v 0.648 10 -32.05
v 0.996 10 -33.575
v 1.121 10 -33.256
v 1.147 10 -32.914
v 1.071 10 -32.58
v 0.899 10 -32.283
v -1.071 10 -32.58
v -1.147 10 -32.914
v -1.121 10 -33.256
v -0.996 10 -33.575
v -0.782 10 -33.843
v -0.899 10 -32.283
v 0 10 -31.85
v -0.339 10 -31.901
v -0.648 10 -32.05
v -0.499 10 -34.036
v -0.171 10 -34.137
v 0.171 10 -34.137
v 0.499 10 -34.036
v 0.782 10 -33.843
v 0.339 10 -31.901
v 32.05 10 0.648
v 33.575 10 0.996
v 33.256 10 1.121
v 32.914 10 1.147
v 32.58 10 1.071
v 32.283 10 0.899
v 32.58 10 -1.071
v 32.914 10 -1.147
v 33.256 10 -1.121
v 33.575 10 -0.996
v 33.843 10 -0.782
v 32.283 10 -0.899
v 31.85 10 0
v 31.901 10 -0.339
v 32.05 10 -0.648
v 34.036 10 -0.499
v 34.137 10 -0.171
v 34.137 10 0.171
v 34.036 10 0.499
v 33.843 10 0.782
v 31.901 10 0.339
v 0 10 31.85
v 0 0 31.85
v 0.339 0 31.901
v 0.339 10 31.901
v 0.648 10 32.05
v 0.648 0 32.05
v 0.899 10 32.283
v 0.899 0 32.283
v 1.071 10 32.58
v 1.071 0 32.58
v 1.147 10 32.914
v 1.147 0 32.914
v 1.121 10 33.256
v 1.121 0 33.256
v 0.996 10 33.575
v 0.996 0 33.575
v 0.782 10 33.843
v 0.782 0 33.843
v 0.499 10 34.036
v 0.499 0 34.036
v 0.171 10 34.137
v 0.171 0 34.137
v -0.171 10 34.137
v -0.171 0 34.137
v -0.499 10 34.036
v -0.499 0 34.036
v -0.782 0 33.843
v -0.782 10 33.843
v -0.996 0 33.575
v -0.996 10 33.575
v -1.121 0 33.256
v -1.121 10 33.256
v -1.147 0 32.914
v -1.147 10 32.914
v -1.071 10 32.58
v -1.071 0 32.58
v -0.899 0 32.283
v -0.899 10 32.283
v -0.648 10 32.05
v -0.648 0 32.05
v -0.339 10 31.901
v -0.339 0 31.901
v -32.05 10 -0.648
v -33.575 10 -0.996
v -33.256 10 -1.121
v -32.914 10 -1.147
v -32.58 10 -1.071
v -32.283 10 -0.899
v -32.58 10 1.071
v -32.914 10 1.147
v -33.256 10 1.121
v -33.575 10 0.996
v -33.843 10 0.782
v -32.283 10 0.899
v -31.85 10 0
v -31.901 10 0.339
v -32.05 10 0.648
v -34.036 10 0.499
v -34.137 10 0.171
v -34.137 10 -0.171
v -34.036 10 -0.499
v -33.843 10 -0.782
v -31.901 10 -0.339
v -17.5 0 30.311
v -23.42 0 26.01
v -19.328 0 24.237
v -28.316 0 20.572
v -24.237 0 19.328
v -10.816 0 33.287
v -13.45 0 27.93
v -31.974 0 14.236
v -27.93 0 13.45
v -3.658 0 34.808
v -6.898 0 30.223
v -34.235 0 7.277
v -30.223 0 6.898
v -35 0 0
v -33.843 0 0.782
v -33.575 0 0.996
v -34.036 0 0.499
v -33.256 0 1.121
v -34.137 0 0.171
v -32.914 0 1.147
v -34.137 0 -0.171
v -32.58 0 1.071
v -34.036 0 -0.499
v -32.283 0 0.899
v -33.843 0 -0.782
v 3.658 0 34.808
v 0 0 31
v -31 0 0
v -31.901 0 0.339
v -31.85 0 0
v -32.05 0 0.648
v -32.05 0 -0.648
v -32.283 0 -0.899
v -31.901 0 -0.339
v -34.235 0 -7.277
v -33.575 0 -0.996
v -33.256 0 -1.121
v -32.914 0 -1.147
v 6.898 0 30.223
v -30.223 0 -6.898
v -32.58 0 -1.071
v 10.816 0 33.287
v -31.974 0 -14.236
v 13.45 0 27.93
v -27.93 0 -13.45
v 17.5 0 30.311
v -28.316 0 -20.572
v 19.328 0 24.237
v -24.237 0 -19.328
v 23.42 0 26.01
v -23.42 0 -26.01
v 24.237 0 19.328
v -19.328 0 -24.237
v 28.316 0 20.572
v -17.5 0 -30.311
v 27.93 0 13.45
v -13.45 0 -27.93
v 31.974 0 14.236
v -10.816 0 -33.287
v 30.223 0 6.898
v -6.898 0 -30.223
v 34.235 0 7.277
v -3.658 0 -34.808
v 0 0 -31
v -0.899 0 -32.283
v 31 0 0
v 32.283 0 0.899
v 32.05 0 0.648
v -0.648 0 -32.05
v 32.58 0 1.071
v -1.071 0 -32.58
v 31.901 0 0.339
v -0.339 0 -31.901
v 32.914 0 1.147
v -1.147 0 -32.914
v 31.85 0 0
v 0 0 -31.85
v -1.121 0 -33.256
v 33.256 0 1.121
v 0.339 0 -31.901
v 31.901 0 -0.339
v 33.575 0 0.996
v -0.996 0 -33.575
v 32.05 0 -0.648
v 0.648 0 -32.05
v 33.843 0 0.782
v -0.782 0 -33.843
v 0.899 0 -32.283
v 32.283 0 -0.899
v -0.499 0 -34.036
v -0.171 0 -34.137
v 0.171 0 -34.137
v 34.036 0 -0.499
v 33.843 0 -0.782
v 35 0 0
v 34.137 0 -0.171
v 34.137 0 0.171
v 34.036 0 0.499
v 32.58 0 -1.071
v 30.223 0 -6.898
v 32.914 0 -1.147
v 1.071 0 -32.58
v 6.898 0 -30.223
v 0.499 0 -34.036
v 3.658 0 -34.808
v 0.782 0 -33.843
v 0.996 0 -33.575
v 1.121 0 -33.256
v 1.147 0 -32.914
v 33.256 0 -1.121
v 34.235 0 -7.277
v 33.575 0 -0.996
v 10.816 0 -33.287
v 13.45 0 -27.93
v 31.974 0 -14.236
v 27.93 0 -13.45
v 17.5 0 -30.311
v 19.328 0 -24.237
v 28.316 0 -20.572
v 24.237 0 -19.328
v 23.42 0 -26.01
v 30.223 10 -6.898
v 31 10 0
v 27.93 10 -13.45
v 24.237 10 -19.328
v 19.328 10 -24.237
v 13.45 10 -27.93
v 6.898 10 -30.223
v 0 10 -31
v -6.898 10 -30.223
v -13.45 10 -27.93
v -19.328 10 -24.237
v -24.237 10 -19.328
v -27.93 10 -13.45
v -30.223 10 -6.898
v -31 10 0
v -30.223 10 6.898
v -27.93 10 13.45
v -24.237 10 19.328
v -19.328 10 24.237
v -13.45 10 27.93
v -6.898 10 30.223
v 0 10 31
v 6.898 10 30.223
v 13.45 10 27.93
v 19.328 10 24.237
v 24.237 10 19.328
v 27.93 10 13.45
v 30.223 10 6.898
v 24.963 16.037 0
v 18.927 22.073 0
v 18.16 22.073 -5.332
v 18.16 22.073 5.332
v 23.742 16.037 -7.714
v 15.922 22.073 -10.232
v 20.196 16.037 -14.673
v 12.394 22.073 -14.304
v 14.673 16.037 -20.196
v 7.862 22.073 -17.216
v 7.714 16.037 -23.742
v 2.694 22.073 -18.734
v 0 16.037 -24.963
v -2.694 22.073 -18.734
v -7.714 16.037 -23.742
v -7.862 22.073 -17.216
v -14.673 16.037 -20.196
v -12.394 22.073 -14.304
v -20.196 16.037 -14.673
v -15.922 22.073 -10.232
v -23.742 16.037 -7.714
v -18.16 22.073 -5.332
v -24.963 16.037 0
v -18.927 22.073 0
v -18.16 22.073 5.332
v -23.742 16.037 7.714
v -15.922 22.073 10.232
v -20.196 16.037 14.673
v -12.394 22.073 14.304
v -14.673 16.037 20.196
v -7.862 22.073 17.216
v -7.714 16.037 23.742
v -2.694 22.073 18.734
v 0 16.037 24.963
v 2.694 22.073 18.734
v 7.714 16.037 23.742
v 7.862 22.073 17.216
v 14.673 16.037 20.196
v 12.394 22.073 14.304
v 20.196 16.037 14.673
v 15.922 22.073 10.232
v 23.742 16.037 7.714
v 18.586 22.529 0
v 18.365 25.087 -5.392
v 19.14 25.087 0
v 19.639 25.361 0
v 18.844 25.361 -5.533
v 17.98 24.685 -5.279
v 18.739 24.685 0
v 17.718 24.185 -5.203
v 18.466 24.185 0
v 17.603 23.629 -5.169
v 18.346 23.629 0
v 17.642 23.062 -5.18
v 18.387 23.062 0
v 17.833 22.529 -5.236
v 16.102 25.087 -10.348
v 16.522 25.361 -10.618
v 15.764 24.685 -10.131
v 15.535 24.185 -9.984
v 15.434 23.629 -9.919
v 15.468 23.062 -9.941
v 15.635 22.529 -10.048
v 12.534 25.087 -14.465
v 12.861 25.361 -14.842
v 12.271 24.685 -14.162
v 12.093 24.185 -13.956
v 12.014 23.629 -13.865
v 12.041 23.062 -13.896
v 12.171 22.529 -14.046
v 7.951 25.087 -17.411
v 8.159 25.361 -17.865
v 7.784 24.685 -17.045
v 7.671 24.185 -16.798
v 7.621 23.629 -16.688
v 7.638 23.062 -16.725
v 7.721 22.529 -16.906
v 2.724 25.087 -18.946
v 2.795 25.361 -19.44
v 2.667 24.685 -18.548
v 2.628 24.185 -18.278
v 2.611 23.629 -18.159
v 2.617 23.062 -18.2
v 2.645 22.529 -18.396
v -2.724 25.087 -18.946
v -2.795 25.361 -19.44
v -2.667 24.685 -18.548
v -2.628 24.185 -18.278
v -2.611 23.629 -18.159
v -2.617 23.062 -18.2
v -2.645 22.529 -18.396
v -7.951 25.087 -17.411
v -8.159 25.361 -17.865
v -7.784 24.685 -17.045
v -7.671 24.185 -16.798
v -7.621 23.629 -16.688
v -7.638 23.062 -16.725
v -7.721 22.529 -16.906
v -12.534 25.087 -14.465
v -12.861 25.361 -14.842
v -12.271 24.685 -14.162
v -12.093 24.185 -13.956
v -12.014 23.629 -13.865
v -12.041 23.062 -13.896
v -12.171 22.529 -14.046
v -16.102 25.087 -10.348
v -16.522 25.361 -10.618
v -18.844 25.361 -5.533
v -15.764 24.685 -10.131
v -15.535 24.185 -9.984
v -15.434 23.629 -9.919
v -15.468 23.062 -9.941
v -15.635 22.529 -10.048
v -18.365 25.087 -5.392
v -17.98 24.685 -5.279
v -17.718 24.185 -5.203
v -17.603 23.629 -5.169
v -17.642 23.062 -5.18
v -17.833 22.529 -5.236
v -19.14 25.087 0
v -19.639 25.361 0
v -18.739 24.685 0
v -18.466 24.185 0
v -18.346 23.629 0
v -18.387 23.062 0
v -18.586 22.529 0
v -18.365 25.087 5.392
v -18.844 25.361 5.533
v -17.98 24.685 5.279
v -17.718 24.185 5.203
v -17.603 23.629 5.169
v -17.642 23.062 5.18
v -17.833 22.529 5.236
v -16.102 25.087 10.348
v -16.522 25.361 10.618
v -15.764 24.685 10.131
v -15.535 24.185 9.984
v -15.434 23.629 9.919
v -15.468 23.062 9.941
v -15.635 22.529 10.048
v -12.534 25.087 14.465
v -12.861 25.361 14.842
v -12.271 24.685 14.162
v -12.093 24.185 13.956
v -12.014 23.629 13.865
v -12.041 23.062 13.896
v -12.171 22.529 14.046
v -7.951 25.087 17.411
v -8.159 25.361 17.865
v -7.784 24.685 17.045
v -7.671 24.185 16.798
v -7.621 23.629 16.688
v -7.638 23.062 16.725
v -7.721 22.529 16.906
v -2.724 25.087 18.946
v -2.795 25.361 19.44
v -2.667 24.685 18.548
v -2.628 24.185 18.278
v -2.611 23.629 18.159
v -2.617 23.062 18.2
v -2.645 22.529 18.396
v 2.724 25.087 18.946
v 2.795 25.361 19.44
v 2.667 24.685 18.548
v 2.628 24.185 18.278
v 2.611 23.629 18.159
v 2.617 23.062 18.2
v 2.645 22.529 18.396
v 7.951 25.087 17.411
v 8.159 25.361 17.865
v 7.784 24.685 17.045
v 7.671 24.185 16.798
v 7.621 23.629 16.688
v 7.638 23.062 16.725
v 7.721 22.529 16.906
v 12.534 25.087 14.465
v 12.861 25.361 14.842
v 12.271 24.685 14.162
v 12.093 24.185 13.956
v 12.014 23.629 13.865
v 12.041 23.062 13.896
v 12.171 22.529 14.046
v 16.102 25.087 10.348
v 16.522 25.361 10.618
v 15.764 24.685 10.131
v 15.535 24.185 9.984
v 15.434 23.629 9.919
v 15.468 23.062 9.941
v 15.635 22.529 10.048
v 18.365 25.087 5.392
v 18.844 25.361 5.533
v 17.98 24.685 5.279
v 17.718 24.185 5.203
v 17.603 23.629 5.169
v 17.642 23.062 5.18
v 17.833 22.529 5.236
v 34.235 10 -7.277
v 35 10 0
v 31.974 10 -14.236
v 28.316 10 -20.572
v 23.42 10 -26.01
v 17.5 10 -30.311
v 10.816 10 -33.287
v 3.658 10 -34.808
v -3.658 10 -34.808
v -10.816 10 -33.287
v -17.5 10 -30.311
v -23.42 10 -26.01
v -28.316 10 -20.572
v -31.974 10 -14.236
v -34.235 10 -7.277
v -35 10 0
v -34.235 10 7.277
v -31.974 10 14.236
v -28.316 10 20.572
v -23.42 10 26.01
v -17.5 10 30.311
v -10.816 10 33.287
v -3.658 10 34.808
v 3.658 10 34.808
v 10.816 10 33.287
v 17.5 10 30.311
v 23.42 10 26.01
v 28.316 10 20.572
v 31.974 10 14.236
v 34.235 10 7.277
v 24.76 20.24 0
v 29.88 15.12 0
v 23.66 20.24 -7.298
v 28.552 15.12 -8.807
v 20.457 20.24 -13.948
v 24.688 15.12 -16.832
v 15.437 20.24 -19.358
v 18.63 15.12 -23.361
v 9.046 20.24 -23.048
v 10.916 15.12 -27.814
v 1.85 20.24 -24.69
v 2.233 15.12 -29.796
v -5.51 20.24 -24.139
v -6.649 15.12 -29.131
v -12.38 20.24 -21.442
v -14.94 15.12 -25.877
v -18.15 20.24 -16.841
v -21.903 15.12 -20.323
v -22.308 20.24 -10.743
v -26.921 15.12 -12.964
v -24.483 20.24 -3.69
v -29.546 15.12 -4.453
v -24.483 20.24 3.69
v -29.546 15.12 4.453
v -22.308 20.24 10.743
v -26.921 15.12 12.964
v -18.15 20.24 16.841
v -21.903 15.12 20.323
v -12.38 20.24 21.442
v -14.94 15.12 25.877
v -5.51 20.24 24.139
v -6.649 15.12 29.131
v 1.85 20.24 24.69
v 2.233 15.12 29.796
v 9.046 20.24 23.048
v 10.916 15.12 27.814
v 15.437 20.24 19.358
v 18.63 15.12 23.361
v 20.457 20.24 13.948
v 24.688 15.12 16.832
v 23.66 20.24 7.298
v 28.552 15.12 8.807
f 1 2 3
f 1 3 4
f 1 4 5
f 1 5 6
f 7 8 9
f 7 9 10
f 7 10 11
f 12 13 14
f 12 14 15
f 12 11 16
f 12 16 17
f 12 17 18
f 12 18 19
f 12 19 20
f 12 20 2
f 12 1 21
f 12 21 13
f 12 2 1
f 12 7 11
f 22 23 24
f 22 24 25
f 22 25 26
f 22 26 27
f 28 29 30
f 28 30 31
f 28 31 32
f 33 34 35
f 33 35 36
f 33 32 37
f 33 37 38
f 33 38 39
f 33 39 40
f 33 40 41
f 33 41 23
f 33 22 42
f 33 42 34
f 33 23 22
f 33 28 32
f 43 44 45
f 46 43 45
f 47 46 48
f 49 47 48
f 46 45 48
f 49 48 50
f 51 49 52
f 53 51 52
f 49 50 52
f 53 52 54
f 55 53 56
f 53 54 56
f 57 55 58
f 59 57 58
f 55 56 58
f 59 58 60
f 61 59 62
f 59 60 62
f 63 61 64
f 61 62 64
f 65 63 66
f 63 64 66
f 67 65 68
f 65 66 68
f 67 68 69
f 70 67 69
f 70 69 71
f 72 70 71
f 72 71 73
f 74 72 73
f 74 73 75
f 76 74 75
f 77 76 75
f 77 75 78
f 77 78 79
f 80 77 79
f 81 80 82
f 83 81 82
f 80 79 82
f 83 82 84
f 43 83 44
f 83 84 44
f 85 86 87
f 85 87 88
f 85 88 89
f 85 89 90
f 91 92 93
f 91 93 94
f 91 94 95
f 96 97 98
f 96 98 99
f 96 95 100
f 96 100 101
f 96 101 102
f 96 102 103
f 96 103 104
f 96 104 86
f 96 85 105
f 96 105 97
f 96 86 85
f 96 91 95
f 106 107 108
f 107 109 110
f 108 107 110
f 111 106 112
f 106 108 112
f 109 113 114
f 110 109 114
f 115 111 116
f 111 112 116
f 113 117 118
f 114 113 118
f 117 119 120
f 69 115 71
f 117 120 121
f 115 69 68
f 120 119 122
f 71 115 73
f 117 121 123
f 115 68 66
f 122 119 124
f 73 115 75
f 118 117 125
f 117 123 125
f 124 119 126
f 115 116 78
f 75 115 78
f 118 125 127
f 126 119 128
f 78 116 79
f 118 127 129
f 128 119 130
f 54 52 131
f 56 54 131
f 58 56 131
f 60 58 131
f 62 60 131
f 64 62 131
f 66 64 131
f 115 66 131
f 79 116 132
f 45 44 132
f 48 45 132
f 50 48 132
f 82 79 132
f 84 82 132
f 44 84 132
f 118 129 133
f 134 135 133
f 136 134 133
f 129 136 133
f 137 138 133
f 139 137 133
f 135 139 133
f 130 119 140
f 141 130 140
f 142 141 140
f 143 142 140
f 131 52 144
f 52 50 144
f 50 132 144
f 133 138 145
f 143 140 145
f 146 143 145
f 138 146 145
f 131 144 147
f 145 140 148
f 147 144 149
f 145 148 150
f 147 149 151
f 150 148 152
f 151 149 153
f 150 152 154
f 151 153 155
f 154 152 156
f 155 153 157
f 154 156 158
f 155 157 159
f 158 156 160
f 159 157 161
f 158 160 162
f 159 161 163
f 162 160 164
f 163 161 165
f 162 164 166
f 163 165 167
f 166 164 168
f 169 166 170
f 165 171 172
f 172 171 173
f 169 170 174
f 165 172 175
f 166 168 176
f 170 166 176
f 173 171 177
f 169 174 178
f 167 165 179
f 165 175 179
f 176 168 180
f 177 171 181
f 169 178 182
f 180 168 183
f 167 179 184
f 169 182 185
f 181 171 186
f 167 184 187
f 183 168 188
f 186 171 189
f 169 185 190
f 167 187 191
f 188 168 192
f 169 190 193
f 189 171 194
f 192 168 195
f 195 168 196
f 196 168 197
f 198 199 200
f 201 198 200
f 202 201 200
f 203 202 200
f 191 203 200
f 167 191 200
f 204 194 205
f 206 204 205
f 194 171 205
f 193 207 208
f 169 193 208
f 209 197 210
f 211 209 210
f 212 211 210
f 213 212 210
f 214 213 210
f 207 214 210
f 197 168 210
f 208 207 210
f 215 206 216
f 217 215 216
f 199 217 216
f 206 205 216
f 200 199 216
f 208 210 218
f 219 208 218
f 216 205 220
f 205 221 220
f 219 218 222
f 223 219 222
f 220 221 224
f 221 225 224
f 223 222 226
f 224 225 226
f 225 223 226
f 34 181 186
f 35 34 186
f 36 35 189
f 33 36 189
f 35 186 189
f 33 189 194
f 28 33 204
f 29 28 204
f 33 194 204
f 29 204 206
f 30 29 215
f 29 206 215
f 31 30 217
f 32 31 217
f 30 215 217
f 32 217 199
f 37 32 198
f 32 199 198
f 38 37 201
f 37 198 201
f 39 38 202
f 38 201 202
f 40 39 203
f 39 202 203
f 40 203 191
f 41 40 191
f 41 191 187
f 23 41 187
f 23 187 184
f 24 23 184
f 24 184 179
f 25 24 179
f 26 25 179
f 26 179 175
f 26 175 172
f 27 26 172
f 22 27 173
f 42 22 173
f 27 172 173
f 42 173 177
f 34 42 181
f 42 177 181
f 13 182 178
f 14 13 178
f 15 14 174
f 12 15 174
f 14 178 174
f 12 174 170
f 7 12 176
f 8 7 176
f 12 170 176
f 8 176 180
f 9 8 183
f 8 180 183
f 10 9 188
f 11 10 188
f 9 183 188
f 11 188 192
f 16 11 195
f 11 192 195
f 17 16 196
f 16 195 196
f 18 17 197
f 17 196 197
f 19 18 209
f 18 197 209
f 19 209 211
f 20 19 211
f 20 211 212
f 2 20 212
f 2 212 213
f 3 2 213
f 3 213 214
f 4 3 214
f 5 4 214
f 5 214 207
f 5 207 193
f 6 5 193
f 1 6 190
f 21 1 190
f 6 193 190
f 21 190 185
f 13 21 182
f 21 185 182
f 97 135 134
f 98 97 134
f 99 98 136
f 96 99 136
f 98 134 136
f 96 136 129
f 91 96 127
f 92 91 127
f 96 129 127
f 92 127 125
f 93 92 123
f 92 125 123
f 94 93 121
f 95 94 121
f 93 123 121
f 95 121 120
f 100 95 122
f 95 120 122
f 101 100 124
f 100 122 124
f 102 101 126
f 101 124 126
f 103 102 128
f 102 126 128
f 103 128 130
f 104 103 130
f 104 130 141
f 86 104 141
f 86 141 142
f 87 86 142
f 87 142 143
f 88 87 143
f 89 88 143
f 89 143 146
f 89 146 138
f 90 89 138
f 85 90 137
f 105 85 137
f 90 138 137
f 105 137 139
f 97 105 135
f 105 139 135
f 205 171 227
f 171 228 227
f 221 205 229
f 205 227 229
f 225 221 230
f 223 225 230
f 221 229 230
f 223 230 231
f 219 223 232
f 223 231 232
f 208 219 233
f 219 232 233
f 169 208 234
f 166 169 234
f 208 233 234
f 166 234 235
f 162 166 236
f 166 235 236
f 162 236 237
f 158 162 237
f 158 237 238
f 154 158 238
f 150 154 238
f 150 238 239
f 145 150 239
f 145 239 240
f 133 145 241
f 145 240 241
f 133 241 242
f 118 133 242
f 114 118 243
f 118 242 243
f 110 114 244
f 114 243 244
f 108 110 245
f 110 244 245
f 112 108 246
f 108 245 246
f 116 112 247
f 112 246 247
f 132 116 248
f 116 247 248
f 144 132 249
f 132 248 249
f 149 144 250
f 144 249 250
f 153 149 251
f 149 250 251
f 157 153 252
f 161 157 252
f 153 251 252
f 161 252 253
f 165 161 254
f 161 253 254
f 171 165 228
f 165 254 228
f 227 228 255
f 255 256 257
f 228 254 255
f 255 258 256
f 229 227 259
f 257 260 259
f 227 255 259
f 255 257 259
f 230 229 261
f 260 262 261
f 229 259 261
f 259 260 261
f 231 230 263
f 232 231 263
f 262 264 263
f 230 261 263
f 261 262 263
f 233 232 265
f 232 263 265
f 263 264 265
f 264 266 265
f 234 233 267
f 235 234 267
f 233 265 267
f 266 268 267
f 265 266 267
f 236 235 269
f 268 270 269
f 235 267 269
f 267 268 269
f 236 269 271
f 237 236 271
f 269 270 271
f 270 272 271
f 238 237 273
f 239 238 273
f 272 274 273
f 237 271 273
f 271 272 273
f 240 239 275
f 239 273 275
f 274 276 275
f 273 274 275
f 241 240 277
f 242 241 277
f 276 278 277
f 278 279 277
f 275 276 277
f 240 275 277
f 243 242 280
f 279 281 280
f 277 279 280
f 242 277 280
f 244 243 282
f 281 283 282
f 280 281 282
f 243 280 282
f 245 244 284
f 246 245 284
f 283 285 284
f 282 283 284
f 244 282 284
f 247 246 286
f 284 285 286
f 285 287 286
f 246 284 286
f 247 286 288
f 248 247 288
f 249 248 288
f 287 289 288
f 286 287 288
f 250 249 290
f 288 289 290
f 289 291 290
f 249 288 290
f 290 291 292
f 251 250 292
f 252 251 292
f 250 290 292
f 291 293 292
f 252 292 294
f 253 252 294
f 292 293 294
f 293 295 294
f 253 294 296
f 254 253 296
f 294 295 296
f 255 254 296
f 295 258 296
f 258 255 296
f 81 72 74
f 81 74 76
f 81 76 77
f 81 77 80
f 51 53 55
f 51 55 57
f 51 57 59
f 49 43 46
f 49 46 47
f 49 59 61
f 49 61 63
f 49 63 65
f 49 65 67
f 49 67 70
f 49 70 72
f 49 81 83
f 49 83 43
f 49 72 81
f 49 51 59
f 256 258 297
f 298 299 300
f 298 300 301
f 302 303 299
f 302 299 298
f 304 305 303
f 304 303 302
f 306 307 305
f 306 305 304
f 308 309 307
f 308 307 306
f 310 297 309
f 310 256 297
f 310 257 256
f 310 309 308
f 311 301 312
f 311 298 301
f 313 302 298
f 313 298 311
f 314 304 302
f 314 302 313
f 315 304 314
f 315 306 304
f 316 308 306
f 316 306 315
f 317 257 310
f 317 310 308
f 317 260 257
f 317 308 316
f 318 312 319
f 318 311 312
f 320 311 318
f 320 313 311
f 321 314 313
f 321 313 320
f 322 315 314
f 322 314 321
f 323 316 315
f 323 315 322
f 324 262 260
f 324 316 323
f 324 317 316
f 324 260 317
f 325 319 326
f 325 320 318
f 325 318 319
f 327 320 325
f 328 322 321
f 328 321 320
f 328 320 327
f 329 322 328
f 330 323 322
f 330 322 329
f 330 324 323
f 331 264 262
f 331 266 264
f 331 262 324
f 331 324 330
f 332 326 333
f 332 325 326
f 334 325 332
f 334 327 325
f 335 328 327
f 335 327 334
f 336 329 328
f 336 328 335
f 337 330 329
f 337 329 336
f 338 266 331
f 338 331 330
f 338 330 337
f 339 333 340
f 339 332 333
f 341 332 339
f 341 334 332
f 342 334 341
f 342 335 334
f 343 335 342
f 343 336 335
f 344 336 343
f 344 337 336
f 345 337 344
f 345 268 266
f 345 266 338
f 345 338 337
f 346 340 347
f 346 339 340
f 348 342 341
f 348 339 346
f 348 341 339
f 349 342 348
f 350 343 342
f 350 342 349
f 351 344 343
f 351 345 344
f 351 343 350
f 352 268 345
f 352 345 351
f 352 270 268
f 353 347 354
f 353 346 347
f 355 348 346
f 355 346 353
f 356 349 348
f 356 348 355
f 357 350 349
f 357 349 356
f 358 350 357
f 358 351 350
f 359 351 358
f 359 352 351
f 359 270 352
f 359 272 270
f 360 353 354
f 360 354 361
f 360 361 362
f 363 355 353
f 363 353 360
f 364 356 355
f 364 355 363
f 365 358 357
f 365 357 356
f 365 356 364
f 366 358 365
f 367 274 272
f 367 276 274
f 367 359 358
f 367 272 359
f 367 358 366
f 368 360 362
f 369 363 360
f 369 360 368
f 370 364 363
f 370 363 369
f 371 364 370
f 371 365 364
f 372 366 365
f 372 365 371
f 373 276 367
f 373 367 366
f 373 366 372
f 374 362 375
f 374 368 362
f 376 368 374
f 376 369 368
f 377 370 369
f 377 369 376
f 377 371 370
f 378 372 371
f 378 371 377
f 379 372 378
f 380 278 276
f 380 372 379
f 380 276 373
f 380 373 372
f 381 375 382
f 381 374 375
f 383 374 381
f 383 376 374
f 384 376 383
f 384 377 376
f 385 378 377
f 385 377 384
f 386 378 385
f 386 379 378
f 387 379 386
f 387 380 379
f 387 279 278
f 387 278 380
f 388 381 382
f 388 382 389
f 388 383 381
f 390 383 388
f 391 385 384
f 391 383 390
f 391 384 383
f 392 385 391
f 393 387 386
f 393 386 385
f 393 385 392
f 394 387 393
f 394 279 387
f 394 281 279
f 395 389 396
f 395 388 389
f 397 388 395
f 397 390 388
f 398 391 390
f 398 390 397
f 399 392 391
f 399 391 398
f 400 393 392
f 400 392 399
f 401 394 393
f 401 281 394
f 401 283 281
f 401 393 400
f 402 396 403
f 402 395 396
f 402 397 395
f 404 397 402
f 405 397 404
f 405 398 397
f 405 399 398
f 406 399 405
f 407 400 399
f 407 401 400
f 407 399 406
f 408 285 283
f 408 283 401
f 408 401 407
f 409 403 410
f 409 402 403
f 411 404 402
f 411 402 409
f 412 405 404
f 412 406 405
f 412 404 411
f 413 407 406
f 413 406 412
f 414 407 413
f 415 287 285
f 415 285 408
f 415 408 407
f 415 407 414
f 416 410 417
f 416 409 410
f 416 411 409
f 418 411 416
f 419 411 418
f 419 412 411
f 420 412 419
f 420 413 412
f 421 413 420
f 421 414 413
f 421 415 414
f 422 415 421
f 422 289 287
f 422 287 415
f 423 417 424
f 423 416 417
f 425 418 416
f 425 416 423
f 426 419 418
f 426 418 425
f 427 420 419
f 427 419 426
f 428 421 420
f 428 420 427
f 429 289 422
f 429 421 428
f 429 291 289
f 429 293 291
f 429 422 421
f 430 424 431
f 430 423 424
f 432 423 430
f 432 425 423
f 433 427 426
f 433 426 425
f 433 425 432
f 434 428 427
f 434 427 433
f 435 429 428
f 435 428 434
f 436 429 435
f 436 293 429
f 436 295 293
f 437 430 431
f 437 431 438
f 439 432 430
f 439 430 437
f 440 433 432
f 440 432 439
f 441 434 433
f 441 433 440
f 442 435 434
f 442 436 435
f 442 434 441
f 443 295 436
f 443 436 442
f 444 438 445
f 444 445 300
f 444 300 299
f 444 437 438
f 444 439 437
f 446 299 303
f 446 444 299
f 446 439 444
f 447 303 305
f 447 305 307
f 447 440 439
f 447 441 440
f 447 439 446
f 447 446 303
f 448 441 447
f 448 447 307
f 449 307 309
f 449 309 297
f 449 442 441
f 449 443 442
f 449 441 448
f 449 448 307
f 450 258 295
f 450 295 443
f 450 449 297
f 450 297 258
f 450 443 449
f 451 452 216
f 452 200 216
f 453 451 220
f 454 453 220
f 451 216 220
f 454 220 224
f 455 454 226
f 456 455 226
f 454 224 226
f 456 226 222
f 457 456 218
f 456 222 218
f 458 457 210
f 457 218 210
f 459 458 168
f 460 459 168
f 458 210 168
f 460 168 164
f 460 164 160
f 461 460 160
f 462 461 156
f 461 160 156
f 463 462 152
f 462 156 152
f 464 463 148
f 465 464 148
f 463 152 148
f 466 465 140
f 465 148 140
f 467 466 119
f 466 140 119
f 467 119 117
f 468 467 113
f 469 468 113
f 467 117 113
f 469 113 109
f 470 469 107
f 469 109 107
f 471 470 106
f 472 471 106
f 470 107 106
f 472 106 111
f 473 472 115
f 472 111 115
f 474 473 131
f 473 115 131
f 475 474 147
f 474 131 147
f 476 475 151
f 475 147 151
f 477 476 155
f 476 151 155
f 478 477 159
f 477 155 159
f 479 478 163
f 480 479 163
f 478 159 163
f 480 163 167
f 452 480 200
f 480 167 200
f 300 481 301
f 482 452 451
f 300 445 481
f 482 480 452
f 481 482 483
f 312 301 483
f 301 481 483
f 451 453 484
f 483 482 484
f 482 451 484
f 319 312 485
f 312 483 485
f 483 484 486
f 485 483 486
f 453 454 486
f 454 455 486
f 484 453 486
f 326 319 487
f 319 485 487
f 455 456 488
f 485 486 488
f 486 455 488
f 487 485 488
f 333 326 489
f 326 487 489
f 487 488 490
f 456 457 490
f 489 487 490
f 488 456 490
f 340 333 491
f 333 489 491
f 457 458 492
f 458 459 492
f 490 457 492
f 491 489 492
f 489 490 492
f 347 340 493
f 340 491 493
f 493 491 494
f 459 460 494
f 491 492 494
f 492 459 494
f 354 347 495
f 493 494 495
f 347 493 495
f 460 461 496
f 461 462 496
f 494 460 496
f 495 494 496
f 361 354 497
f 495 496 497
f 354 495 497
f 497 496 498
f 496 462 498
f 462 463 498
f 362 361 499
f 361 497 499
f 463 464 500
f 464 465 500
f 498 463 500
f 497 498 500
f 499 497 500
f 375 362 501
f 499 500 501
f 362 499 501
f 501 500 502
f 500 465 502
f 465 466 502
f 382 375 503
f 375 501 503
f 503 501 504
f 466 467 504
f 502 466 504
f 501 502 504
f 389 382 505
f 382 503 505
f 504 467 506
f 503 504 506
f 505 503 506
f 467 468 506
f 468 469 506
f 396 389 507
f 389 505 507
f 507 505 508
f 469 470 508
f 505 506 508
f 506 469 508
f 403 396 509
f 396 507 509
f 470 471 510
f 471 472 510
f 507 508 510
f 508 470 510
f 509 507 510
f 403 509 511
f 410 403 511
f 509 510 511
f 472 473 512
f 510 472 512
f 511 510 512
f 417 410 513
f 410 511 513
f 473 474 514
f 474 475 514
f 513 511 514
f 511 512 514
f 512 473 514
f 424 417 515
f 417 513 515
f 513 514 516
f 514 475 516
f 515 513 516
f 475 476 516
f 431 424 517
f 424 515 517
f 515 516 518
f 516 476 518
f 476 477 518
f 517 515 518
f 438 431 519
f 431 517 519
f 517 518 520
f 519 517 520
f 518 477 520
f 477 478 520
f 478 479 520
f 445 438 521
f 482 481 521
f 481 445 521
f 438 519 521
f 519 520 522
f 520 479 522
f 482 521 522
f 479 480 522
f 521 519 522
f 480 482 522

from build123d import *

# Parameters (mm, degrees)
FILLET1_R          = 2
SKETCH3_R          = 1.15
CUT_EXTRUDE1_DEPTH = 10
CIRPATTERN1_COUNT  = 4


with BuildPart() as part:
    # Sketch2 → Revolve1 (revolve)
    with BuildSketch(Plane.XY, mode=Mode.PRIVATE) as revolve1_sk:
        Polygon((-31, 0), (-31, 10), (-15.639434665, 25.360565335), (-19.639434665, 25.360565335), (-35, 10), (-35, 0), align=None)
    revolve(revolve1_sk.sketch.rotate(Axis((0, 0, 0), (0, 1, 0)), 180), axis=Axis((0, 0, 0), (0, 1, 0)))

    # Fillet1
    # the kernel refuses this fillet: 2 mm, written as the material it takes off along each edge
    with BuildSketch(Plane(origin=(0, 25.360565335, 0), x_dir=(1, 0, 0), z_dir=(0, 0, 1))) as fillet1_piece_1:
        with BuildLine():
            CenterArc((20.340836733, -1.872974943), FILLET1_R, 110.530199479, 114.469800521)
            Line((19.639434665, 0), (19.625406624, 0.037459499))
            ThreePointArc((19.625406624, 0.037459499), (17.639434665, 0.04), (15.639434665, 0.04))
            Line((15.639434665, 0.04), (15.611150394, -0.028284271))
            Line((15.611150394, -0.028284271), (18.8983389, -3.315472777))
            Line((18.8983389, -3.315472777), (18.926623171, -3.287188506))
        make_face()
    revolve(axis=Axis((0, 25.360565335, 0), (0, 1, 0)), mode=Mode.SUBTRACT)

    # Sketch3 → Cut-Extrude1 (cut)
    with BuildSketch(Plane.XZ):
        with Locations(Location((0, 33, 0), (0, 0, 270))):
            Circle(SKETCH3_R)
    cut_extrude1 = extrude(amount=-CUT_EXTRUDE1_DEPTH, mode=Mode.SUBTRACT)

    # CirPattern1: Cut-Extrude1 ×4 about axis
    cirpattern1_axis = Axis((0, 0, 0), (0, 1, 0))
    for i in range(1, CIRPATTERN1_COUNT):
        add(cut_extrude1.rotate(cirpattern1_axis, i * 360 / CIRPATTERN1_COUNT), mode=Mode.SUBTRACT)


solid = part.part
